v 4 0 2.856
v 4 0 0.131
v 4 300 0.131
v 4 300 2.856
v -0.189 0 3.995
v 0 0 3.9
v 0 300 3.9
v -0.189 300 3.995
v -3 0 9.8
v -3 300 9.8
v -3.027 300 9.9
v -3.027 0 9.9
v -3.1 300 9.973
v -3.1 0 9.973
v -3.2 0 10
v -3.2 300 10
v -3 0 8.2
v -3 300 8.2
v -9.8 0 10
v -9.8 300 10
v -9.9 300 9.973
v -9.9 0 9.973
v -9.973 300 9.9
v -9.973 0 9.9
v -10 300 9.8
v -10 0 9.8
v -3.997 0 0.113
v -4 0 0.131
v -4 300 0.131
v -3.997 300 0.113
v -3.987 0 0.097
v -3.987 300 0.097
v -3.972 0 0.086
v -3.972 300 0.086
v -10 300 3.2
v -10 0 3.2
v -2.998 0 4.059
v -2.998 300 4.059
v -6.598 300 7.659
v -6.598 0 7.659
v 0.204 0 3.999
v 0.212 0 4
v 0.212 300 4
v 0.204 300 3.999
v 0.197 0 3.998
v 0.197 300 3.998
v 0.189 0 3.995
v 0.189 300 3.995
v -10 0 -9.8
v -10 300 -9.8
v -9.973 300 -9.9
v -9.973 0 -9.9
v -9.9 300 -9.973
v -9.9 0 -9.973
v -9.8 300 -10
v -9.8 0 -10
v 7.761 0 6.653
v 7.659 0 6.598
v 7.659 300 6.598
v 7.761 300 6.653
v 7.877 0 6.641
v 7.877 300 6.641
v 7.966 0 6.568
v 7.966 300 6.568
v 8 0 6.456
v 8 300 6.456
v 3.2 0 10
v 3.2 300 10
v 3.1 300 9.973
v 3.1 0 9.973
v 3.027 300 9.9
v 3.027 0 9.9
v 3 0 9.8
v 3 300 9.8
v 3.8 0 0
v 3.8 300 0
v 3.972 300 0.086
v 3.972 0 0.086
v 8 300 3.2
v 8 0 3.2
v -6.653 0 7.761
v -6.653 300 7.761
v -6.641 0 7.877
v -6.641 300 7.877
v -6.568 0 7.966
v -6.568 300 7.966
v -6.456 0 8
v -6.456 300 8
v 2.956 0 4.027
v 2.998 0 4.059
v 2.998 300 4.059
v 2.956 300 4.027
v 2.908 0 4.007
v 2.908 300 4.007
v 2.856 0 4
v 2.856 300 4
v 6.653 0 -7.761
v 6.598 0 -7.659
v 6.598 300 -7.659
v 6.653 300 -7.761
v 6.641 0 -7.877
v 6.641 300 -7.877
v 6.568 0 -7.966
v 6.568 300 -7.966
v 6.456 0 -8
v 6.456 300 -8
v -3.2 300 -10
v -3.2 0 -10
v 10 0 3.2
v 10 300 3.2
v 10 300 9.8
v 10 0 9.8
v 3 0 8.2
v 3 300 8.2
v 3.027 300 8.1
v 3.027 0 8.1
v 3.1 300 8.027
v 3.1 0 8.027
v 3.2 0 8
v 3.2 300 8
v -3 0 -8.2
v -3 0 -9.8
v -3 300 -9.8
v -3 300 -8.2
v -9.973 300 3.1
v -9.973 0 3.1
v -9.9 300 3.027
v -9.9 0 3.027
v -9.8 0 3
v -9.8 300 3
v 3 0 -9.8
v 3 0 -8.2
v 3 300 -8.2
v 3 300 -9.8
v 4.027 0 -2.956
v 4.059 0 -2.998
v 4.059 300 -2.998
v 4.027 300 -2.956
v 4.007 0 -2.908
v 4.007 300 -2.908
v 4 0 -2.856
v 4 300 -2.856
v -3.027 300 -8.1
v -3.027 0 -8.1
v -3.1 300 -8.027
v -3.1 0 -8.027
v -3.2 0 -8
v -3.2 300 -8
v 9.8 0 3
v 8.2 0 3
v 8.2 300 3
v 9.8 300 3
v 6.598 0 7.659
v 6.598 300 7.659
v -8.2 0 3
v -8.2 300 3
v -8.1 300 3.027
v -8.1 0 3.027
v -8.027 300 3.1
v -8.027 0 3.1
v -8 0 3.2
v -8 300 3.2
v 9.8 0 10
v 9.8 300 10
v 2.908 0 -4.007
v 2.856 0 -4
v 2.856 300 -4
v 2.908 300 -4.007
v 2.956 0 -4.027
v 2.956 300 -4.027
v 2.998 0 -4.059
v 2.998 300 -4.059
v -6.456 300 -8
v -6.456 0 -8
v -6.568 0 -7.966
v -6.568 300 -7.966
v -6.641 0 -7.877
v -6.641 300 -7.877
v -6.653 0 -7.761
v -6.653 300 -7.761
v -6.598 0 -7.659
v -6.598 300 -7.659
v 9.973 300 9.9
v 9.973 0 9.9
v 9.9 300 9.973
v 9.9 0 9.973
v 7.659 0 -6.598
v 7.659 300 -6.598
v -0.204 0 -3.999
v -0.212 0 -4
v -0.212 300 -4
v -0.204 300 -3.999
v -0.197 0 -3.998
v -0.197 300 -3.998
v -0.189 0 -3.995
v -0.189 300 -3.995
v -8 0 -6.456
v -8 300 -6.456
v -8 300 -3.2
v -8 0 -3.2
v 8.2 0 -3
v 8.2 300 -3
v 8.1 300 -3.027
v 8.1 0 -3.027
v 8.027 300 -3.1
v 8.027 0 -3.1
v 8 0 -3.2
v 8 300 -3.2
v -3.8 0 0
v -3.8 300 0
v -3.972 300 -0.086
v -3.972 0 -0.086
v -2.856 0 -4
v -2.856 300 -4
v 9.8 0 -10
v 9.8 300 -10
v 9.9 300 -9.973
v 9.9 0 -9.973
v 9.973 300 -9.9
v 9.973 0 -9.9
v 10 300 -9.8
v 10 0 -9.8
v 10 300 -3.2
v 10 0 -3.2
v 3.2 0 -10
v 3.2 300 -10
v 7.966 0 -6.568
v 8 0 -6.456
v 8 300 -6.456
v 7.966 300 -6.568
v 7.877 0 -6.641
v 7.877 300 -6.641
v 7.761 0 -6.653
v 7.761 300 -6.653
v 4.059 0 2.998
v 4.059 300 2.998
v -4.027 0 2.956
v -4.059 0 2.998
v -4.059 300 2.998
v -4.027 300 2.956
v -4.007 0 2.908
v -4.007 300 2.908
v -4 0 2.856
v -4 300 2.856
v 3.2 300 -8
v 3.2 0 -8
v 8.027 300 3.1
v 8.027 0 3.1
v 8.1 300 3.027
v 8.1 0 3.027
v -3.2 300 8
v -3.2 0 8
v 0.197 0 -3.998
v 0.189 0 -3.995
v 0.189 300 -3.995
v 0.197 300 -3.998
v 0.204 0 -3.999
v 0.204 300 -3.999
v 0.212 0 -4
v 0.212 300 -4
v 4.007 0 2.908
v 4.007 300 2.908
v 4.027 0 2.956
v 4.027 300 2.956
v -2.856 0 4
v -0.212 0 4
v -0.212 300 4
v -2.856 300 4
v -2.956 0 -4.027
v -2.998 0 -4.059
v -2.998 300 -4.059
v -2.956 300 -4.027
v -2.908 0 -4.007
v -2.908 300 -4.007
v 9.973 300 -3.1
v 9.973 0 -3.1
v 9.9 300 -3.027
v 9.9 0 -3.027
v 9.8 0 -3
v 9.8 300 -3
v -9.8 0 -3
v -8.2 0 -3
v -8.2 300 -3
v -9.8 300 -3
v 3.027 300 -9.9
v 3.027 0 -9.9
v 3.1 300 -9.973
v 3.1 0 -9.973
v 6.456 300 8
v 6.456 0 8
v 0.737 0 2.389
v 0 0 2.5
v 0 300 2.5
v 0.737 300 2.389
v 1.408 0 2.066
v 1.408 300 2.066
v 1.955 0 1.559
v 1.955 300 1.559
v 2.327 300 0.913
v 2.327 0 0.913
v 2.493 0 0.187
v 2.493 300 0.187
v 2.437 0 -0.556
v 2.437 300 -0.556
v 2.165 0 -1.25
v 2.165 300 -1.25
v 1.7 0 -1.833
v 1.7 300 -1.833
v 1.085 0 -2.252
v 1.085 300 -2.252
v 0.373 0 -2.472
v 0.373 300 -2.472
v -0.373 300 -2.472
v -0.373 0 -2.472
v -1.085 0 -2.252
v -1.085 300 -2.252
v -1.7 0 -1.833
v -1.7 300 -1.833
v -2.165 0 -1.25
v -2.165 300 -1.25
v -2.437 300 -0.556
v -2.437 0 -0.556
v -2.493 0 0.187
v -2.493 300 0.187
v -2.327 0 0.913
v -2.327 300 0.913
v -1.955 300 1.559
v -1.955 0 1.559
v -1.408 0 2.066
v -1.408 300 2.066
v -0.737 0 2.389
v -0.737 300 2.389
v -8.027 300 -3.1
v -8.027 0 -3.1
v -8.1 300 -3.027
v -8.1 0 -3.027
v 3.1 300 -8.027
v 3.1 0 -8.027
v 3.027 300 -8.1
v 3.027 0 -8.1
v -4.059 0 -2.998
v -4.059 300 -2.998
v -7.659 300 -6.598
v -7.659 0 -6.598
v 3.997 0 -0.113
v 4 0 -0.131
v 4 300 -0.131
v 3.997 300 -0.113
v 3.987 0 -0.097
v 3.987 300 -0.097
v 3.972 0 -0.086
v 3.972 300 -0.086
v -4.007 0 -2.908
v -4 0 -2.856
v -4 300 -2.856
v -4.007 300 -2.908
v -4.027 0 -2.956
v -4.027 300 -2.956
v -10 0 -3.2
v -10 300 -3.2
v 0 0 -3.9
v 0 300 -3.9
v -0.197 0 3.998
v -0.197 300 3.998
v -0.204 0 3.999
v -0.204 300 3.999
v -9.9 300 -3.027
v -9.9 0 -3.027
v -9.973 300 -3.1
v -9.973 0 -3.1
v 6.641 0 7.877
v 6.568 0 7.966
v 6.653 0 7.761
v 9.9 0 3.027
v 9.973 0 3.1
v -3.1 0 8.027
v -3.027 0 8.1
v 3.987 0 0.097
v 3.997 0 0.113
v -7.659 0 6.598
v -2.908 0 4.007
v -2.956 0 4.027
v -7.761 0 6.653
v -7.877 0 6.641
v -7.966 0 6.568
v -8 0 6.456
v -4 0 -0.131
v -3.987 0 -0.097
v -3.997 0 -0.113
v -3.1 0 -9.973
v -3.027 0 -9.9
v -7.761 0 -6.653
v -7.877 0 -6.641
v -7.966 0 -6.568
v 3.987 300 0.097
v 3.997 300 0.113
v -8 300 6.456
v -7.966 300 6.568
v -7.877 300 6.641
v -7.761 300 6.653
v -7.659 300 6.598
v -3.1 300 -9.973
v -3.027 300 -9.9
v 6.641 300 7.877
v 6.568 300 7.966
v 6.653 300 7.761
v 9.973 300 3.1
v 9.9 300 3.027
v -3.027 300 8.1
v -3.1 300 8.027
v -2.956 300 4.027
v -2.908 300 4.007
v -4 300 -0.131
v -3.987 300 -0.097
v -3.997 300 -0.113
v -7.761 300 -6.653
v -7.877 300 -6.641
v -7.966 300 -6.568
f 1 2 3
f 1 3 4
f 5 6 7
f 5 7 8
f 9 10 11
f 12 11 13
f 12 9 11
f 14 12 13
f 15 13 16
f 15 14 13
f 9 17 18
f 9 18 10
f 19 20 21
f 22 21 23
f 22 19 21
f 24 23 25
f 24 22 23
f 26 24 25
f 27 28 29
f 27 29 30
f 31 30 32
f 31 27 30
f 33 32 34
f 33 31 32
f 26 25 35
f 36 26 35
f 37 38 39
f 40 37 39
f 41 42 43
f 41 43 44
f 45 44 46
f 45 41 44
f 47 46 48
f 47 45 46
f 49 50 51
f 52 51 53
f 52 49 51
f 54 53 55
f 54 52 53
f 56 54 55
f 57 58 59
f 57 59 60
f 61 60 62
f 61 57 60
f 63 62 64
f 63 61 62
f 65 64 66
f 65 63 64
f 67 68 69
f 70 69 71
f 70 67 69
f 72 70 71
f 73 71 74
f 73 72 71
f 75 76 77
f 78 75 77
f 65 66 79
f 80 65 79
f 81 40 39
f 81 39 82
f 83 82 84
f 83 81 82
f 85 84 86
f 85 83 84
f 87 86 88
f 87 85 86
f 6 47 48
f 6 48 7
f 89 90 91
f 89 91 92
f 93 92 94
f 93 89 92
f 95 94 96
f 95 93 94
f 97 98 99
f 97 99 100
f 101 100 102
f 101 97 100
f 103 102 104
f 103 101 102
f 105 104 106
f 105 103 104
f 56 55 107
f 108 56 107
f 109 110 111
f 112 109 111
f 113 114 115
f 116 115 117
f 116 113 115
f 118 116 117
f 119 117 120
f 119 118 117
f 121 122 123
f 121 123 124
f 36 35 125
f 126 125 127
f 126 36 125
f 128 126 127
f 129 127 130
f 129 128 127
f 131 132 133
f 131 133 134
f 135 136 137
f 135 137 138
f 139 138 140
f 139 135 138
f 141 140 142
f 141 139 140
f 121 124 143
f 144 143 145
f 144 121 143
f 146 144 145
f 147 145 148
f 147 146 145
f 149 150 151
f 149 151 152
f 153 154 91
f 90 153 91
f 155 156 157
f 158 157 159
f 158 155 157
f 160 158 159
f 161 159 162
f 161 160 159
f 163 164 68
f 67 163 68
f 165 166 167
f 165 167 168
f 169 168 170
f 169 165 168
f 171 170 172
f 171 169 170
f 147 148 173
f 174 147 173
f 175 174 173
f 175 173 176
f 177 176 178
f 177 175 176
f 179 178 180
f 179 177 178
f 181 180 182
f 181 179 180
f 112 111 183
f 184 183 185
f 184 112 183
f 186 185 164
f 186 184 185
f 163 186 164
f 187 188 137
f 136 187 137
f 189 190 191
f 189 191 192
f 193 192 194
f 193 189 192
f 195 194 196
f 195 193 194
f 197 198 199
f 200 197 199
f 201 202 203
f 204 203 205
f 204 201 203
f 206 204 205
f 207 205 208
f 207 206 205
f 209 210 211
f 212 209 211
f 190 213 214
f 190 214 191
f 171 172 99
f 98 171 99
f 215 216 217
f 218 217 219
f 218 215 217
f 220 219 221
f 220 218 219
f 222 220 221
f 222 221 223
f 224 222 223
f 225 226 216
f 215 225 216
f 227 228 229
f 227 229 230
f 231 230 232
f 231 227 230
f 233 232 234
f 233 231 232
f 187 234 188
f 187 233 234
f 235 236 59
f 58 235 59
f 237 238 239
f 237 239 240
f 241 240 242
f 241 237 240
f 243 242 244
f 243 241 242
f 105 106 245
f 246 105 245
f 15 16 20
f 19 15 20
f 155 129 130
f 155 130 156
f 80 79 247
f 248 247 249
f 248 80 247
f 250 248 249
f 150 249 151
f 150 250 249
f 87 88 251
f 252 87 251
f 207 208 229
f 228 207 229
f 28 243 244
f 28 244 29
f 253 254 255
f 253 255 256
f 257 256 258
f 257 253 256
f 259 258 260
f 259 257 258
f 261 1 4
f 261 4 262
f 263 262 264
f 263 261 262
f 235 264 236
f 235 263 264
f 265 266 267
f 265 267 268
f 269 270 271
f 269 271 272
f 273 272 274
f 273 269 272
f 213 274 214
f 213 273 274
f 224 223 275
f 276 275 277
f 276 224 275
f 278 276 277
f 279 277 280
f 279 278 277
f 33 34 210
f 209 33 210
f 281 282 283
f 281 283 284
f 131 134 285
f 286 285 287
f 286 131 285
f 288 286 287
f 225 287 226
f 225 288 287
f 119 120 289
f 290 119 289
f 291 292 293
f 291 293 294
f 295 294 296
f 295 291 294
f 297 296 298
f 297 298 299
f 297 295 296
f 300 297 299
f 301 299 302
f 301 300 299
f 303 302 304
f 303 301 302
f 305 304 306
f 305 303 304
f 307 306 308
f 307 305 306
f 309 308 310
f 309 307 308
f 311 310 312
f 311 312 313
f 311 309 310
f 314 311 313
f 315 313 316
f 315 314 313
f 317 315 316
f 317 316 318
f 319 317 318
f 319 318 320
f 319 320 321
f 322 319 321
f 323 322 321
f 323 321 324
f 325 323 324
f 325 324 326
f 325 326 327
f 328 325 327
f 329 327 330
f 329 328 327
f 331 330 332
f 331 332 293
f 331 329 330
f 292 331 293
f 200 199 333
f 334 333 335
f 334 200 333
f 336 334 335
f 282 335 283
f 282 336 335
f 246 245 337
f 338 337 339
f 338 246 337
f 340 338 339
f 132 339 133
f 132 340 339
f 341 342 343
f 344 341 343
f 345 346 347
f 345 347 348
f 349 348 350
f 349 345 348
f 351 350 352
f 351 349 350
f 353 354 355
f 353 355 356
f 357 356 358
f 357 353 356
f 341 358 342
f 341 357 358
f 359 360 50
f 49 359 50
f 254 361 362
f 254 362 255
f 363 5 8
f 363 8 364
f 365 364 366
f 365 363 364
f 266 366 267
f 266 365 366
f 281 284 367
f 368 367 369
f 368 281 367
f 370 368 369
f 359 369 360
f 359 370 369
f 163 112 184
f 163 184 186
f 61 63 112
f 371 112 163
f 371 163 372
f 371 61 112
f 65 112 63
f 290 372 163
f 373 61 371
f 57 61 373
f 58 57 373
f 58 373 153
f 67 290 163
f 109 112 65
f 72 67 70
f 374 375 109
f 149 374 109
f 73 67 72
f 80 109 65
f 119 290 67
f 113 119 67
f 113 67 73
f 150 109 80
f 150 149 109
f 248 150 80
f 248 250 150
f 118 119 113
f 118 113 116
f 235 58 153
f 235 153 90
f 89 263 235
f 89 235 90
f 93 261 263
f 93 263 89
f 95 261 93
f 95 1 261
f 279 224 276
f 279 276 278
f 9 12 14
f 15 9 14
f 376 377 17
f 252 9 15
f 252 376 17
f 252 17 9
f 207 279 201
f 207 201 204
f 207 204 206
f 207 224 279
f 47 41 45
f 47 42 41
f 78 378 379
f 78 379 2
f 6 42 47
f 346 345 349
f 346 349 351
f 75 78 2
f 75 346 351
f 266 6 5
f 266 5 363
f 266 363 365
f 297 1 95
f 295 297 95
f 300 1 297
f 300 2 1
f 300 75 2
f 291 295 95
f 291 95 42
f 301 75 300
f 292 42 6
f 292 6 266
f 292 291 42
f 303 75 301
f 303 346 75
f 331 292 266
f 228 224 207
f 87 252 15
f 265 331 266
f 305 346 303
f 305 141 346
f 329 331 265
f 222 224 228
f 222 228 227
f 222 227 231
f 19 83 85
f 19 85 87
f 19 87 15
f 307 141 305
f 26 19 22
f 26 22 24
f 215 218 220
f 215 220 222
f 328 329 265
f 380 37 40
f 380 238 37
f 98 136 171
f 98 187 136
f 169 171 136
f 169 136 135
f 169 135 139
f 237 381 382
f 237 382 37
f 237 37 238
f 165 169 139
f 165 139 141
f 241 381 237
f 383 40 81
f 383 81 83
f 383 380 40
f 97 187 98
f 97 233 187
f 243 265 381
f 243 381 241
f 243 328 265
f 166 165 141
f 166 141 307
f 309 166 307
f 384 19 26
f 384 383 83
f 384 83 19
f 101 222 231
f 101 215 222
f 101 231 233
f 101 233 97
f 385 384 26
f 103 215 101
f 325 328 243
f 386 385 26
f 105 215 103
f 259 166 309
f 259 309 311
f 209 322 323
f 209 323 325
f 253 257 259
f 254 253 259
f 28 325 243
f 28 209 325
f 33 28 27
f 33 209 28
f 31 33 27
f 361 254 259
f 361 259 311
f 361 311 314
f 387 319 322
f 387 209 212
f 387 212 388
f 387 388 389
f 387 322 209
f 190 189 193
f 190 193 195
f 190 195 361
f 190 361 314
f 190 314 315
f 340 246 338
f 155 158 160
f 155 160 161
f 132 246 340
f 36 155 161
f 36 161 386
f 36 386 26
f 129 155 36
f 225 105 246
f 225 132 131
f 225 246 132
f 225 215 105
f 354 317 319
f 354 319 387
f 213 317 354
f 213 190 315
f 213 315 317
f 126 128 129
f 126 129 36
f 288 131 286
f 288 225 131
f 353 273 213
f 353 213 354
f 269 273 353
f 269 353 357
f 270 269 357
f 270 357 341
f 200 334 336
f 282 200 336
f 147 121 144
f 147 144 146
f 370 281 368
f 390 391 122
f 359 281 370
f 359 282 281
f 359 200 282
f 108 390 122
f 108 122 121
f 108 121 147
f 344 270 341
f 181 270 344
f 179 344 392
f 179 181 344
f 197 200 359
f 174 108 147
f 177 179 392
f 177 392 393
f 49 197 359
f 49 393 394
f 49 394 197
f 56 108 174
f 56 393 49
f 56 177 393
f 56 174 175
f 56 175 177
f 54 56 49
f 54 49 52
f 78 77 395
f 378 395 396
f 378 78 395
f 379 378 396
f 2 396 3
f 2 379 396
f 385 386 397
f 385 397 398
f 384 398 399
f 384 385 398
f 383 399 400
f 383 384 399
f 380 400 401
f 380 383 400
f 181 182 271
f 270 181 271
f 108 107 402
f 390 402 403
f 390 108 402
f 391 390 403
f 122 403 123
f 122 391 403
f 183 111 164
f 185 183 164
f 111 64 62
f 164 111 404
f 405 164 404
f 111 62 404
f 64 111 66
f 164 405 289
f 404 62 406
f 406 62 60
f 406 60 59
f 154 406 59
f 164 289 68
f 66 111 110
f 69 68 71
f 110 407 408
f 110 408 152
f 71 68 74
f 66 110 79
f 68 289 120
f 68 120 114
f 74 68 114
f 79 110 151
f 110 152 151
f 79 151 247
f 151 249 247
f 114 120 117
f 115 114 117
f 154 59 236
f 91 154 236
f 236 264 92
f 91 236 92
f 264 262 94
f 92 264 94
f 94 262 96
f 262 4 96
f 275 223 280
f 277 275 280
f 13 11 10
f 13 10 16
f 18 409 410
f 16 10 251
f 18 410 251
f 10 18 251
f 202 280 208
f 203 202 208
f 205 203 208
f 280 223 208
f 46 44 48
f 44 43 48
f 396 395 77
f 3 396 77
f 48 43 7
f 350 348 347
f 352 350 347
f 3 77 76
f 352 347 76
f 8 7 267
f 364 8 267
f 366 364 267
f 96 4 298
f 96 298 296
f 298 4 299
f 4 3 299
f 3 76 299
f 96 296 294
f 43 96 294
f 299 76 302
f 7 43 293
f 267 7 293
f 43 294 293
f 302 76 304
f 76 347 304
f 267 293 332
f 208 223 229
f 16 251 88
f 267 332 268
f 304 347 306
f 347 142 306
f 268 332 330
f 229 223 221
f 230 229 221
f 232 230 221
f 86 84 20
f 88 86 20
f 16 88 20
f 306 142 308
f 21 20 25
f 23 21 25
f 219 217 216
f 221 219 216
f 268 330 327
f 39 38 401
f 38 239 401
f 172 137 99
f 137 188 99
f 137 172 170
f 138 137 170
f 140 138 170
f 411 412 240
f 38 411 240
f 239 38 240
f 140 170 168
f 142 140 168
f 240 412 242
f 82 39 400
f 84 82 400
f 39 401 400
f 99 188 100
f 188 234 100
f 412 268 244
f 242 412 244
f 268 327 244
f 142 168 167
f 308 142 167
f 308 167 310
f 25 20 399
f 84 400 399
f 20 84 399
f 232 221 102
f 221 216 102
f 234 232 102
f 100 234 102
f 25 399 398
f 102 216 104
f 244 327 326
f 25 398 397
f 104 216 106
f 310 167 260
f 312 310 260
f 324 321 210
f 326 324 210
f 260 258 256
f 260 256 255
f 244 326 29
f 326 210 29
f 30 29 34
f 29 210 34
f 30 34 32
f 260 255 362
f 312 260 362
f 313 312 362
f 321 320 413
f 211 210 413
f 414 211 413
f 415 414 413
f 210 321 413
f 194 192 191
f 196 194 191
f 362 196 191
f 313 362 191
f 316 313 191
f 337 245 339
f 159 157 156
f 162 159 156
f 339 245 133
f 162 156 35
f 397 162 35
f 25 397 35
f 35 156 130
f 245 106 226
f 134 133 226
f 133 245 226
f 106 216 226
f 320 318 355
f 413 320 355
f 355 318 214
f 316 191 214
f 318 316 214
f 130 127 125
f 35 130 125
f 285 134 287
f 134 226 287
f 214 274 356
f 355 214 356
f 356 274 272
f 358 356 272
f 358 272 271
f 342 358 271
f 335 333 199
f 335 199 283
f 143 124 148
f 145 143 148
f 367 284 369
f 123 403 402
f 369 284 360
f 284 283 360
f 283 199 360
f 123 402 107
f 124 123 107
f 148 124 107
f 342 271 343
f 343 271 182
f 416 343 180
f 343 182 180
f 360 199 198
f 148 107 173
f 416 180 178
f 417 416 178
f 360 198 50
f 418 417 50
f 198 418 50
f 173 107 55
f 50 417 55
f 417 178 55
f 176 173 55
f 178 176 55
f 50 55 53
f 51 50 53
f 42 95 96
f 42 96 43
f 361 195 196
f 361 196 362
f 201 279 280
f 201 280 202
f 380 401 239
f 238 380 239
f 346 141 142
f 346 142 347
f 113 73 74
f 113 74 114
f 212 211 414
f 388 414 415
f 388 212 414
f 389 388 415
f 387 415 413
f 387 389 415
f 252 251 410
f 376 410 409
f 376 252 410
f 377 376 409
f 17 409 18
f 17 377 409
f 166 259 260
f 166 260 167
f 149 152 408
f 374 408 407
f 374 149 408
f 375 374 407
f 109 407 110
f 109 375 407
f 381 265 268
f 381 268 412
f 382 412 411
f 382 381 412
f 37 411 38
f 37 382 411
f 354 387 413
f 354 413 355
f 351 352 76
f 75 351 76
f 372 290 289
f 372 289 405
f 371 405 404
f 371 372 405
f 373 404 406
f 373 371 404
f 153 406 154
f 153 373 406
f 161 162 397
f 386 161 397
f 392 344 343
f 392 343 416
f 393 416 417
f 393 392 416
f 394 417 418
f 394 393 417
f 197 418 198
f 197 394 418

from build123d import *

# Parameters (mm, degrees)
SKETCH1_R           = 2.5
BOSS_EXTRUDE1_DEPTH = 300


with BuildPart() as part:
    # Sketch1 → Boss-Extrude1 (new body)
    with BuildSketch(Plane(origin=(0, 0, 0), x_dir=(1, 0, 0), z_dir=(0, 1, 0))):
        with BuildLine():
            Line((-2.997918472, 4.058578644), (-6.597918472, 7.658578644))
            ThreePointArc((-6.597918472, 7.658578644), (-6.621415508, 7.686854412), (-6.639339828, 7.718953455))
            ThreePointArc((-6.639339828, 7.718953455), (-6.656497116, 7.8), (-6.639339828, 7.881046545))
            ThreePointArc((-6.639339828, 7.881046545), (-6.565562901, 7.967644429), (-6.456497116, 8))
            Line((-6.456497116, 8), (-3.2, 8))
            ThreePointArc((-3.2, 8), (-3.058578644, 8.058578644), (-3, 8.2))
            Line((-3, 8.2), (-3, 9.8))
            ThreePointArc((-3, 9.8), (-3.058578644, 9.941421356), (-3.2, 10))
            Line((-3.2, 10), (-9.8, 10))
            ThreePointArc((-9.8, 10), (-9.941421356, 9.941421356), (-10, 9.8))
            Line((-10, 9.8), (-10, 3.2))
            ThreePointArc((-10, 3.2), (-9.941421356, 3.058578644), (-9.8, 3))
            Line((-9.8, 3), (-8.2, 3))
            ThreePointArc((-8.2, 3), (-8.058578644, 3.058578644), (-8, 3.2))
            Line((-8, 3.2), (-8, 6.456497116))
            ThreePointArc((-8, 6.456497116), (-7.967644429, 6.565562901), (-7.881046545, 6.639339828))
            ThreePointArc((-7.881046545, 6.639339828), (-7.8, 6.656497116), (-7.718953455, 6.639339828))
            ThreePointArc((-7.718953455, 6.639339828), (-7.686854412, 6.621415508), (-7.658578644, 6.597918472))
            Line((-7.658578644, 6.597918472), (-4.058578644, 2.997918472))
            ThreePointArc((-4.058578644, 2.997918472), (-4.015224093, 2.933033802), (-4, 2.856497116))
            Line((-4, 2.856497116), (-4, 0.130901699))
            ThreePointArc((-4, 0.130901699), (-3.99253254, 0.104615144), (-3.97236068, 0.08618034))
            Line((-3.97236068, 0.08618034), (-3.8, 0))
            Line((-3.8, 0), (-3.97236068, -0.08618034))
            ThreePointArc((-3.97236068, -0.08618034), (-3.99253254, -0.104615144), (-4, -0.130901699))
            Line((-4, -0.130901699), (-4, -2.856497116))
            ThreePointArc((-4, -2.856497116), (-4.015224093, -2.933033802), (-4.058578644, -2.997918472))
            Line((-4.058578644, -2.997918472), (-7.658578644, -6.597918472))
            ThreePointArc((-7.658578644, -6.597918472), (-7.686854412, -6.621415508), (-7.718953455, -6.639339828))
            ThreePointArc((-7.718953455, -6.639339828), (-7.8, -6.656497116), (-7.881046545, -6.639339828))
            ThreePointArc((-7.881046545, -6.639339828), (-7.967644429, -6.565562901), (-8, -6.456497116))
            Line((-8, -6.456497116), (-8, -3.2))
            ThreePointArc((-8, -3.2), (-8.058578644, -3.058578644), (-8.2, -3))
            Line((-8.2, -3), (-9.8, -3))
            ThreePointArc((-9.8, -3), (-9.941421356, -3.058578644), (-10, -3.2))
            Line((-10, -3.2), (-10, -9.8))
            ThreePointArc((-10, -9.8), (-9.941421356, -9.941421356), (-9.8, -10))
            Line((-9.8, -10), (-3.2, -10))
            ThreePointArc((-3.2, -10), (-3.058578644, -9.941421356), (-3, -9.8))
            Line((-3, -9.8), (-3, -8.2))
            ThreePointArc((-3, -8.2), (-3.058578644, -8.058578644), (-3.2, -8))
            Line((-3.2, -8), (-6.456497116, -8))
            ThreePointArc((-6.456497116, -8), (-6.565562901, -7.967644429), (-6.639339828, -7.881046545))
            ThreePointArc((-6.639339828, -7.881046545), (-6.656497116, -7.8), (-6.639339828, -7.718953455))
            ThreePointArc((-6.639339828, -7.718953455), (-6.621415508, -7.686854412), (-6.597918472, -7.658578644))
            Line((-6.597918472, -7.658578644), (-2.997918472, -4.058578644))
            ThreePointArc((-2.997918472, -4.058578644), (-2.933033802, -4.015224093), (-2.856497116, -4))
            Line((-2.856497116, -4), (-0.211803399, -4))
            ThreePointArc((-0.211803399, -4), (-0.200315753, -3.998662449), (-0.189442719, -3.99472136))
            Line((-0.189442719, -3.99472136), (0, -3.9))
            Line((0, -3.9), (0.189442719, -3.99472136))
            ThreePointArc((0.189442719, -3.99472136), (0.200315753, -3.998662449), (0.211803399, -4))
            Line((0.211803399, -4), (2.856497116, -4))
            ThreePointArc((2.856497116, -4), (2.933033802, -4.015224093), (2.997918472, -4.058578644))
            Line((2.997918472, -4.058578644), (6.597918472, -7.658578644))
            ThreePointArc((6.597918472, -7.658578644), (6.621415508, -7.686854412), (6.639339828, -7.718953455))
            ThreePointArc((6.639339828, -7.718953455), (6.656497116, -7.8), (6.639339828, -7.881046545))
            ThreePointArc((6.639339828, -7.881046545), (6.565562901, -7.967644429), (6.456497116, -8))
            Line((6.456497116, -8), (3.2, -8))
            ThreePointArc((3.2, -8), (3.058578644, -8.058578644), (3, -8.2))
            Line((3, -8.2), (3, -9.8))
            ThreePointArc((3, -9.8), (3.058578644, -9.941421356), (3.2, -10))
            Line((3.2, -10), (9.8, -10))
            ThreePointArc((9.8, -10), (9.941421356, -9.941421356), (10, -9.8))
            Line((10, -9.8), (10, -3.2))
            ThreePointArc((10, -3.2), (9.941421356, -3.058578644), (9.8, -3))
            Line((9.8, -3), (8.2, -3))
            ThreePointArc((8.2, -3), (8.058578644, -3.058578644), (8, -3.2))
            Line((8, -3.2), (8, -6.456497116))
            ThreePointArc((8, -6.456497116), (7.967644429, -6.565562901), (7.881046545, -6.639339828))
            ThreePointArc((7.881046545, -6.639339828), (7.8, -6.656497116), (7.718953455, -6.639339828))
            ThreePointArc((7.718953455, -6.639339828), (7.686854412, -6.621415508), (7.658578644, -6.597918472))
            Line((7.658578644, -6.597918472), (4.058578644, -2.997918472))
            ThreePointArc((4.058578644, -2.997918472), (4.015224093, -2.933033802), (4, -2.856497116))
            Line((4, -2.856497116), (4, -0.130901699))
            ThreePointArc((4, -0.130901699), (3.99253254, -0.104615144), (3.97236068, -0.08618034))
            Line((3.97236068, -0.08618034), (3.8, 0))
            Line((3.8, 0), (3.97236068, 0.08618034))
            ThreePointArc((3.97236068, 0.08618034), (3.99253254, 0.104615144), (4, 0.130901699))
            Line((4, 0.130901699), (4, 2.856497116))
            ThreePointArc((4, 2.856497116), (4.015224093, 2.933033802), (4.058578644, 2.997918472))
            Line((4.058578644, 2.997918472), (7.658578644, 6.597918472))
            ThreePointArc((7.658578644, 6.597918472), (7.686854412, 6.621415508), (7.718953455, 6.639339828))
            ThreePointArc((7.718953455, 6.639339828), (7.8, 6.656497116), (7.881046545, 6.639339828))
            ThreePointArc((7.881046545, 6.639339828), (7.967644429, 6.565562901), (8, 6.456497116))
            Line((8, 6.456497116), (8, 3.2))
            ThreePointArc((8, 3.2), (8.058578644, 3.058578644), (8.2, 3))
            Line((8.2, 3), (9.8, 3))
            ThreePointArc((9.8, 3), (9.941421356, 3.058578644), (10, 3.2))
            Line((10, 3.2), (10, 9.8))
            ThreePointArc((10, 9.8), (9.941421356, 9.941421356), (9.8, 10))
            Line((9.8, 10), (3.2, 10))
            ThreePointArc((3.2, 10), (3.058578644, 9.941421356), (3, 9.8))
            Line((3, 9.8), (3, 8.2))
            ThreePointArc((3, 8.2), (3.058578644, 8.058578644), (3.2, 8))
            Line((3.2, 8), (6.456497116, 8))
            ThreePointArc((6.456497116, 8), (6.565562901, 7.967644429), (6.639339828, 7.881046545))
            ThreePointArc((6.639339828, 7.881046545), (6.656497116, 7.8), (6.639339828, 7.718953455))
            ThreePointArc((6.639339828, 7.718953455), (6.621415508, 7.686854412), (6.597918472, 7.658578644))
            Line((6.597918472, 7.658578644), (2.997918472, 4.058578644))
            ThreePointArc((2.997918472, 4.058578644), (2.933033802, 4.015224093), (2.856497116, 4))
            Line((2.856497116, 4), (0.211803399, 4))
            ThreePointArc((0.211803399, 4), (0.200315753, 3.998662449), (0.189442719, 3.99472136))
            Line((0.189442719, 3.99472136), (0, 3.9))
            Line((0, 3.9), (-0.189442719, 3.99472136))
            ThreePointArc((-0.189442719, 3.99472136), (-0.200315753, 3.998662449), (-0.211803399, 4))
            Line((-0.211803399, 4), (-2.856497116, 4))
            ThreePointArc((-2.856497116, 4), (-2.933033802, 4.015224093), (-2.997918472, 4.058578644))
        make_face()
        Circle(SKETCH1_R, mode=Mode.SUBTRACT)
    extrude(amount=BOSS_EXTRUDE1_DEPTH)


solid = part.part
